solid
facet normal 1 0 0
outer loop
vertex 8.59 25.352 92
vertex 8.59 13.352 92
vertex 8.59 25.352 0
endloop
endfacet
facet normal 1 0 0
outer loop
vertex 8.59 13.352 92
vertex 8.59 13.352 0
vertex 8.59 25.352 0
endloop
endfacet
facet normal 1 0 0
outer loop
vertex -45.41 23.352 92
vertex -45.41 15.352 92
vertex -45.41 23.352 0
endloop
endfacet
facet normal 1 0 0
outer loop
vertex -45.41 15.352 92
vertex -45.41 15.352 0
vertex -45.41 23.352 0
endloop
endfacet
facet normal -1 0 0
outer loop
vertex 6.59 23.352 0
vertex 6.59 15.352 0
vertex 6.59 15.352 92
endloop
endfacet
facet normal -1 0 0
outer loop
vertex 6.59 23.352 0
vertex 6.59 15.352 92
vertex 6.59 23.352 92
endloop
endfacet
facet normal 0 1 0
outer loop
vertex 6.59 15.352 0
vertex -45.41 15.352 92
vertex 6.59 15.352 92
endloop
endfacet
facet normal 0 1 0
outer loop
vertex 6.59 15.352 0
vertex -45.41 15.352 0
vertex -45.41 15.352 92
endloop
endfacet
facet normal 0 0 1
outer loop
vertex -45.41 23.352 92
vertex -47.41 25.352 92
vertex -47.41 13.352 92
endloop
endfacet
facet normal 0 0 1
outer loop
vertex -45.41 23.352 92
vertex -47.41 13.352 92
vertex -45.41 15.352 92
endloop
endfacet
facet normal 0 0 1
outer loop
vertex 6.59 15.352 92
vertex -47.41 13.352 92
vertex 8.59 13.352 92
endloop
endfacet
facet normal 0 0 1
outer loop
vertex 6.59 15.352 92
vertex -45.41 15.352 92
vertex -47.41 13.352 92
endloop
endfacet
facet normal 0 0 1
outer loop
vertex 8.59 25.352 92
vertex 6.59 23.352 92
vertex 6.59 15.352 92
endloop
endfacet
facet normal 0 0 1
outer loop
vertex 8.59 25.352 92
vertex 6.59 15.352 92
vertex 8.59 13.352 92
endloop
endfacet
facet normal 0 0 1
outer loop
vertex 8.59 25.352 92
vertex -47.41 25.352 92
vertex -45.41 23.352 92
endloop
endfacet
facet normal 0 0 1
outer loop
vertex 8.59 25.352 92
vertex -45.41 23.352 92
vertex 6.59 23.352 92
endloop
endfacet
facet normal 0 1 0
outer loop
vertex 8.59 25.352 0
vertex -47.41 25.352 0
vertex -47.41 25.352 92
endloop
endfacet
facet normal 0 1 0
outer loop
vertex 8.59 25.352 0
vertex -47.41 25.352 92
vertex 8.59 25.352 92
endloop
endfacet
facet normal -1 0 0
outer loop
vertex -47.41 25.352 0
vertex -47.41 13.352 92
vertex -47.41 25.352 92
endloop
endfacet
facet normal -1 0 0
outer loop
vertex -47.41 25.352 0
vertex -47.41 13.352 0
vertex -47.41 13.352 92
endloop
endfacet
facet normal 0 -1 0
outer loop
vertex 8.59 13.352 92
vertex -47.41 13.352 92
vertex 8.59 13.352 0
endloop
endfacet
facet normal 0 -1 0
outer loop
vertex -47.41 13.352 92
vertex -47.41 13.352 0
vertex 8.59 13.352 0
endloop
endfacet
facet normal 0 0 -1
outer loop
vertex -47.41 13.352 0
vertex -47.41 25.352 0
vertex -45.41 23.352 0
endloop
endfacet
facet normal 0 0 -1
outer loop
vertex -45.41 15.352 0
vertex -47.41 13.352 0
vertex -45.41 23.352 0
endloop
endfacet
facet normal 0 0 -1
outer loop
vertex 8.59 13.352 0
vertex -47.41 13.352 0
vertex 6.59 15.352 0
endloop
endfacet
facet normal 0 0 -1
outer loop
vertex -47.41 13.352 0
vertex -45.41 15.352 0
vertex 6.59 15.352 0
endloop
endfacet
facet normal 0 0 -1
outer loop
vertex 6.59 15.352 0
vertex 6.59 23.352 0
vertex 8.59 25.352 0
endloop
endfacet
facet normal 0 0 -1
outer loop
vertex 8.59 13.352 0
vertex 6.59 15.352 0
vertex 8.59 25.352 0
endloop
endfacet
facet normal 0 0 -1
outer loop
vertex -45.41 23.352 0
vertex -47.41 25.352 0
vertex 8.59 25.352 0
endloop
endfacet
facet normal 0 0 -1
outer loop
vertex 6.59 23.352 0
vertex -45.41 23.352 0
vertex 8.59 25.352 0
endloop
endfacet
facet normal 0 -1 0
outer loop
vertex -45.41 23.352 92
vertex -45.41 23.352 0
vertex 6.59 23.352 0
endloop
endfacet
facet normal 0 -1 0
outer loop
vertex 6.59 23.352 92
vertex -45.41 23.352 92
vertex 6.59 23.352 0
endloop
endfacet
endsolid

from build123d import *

# Parameters (mm, degrees)
F0_W        = 56
F0_H        = 12
F0_W_2      = 52
F0_H_2      = 8
F1_DEPTH    = 90
F1_FACE_W   = 56
F1_FACE_H   = 12
F1_FACE_W_2 = 52
F1_FACE_H_2 = 8
F2_DEPTH    = 2


with BuildPart() as f1:
    # F0 (on Top) → F1 (new body)
    with BuildSketch(Plane.XY):
        with Locations((-19.410297, 19.352412)):
            Rectangle(F0_W, F0_H)
        with Locations((-19.410297, 19.352412)):
            Rectangle(F0_W_2, F0_H_2, mode=Mode.SUBTRACT)
    extrude(amount=F1_DEPTH)

    # F1_face (on face) → F2 (join)
    with BuildSketch(Plane(origin=(-19.410297, 19.352412, 90), x_dir=(1, 0, 0), z_dir=(0, 0, 1))):
        Rectangle(F1_FACE_W, F1_FACE_H)
        Rectangle(F1_FACE_W_2, F1_FACE_H_2, mode=Mode.SUBTRACT)
    extrude(amount=F2_DEPTH)


solid = f1.part
